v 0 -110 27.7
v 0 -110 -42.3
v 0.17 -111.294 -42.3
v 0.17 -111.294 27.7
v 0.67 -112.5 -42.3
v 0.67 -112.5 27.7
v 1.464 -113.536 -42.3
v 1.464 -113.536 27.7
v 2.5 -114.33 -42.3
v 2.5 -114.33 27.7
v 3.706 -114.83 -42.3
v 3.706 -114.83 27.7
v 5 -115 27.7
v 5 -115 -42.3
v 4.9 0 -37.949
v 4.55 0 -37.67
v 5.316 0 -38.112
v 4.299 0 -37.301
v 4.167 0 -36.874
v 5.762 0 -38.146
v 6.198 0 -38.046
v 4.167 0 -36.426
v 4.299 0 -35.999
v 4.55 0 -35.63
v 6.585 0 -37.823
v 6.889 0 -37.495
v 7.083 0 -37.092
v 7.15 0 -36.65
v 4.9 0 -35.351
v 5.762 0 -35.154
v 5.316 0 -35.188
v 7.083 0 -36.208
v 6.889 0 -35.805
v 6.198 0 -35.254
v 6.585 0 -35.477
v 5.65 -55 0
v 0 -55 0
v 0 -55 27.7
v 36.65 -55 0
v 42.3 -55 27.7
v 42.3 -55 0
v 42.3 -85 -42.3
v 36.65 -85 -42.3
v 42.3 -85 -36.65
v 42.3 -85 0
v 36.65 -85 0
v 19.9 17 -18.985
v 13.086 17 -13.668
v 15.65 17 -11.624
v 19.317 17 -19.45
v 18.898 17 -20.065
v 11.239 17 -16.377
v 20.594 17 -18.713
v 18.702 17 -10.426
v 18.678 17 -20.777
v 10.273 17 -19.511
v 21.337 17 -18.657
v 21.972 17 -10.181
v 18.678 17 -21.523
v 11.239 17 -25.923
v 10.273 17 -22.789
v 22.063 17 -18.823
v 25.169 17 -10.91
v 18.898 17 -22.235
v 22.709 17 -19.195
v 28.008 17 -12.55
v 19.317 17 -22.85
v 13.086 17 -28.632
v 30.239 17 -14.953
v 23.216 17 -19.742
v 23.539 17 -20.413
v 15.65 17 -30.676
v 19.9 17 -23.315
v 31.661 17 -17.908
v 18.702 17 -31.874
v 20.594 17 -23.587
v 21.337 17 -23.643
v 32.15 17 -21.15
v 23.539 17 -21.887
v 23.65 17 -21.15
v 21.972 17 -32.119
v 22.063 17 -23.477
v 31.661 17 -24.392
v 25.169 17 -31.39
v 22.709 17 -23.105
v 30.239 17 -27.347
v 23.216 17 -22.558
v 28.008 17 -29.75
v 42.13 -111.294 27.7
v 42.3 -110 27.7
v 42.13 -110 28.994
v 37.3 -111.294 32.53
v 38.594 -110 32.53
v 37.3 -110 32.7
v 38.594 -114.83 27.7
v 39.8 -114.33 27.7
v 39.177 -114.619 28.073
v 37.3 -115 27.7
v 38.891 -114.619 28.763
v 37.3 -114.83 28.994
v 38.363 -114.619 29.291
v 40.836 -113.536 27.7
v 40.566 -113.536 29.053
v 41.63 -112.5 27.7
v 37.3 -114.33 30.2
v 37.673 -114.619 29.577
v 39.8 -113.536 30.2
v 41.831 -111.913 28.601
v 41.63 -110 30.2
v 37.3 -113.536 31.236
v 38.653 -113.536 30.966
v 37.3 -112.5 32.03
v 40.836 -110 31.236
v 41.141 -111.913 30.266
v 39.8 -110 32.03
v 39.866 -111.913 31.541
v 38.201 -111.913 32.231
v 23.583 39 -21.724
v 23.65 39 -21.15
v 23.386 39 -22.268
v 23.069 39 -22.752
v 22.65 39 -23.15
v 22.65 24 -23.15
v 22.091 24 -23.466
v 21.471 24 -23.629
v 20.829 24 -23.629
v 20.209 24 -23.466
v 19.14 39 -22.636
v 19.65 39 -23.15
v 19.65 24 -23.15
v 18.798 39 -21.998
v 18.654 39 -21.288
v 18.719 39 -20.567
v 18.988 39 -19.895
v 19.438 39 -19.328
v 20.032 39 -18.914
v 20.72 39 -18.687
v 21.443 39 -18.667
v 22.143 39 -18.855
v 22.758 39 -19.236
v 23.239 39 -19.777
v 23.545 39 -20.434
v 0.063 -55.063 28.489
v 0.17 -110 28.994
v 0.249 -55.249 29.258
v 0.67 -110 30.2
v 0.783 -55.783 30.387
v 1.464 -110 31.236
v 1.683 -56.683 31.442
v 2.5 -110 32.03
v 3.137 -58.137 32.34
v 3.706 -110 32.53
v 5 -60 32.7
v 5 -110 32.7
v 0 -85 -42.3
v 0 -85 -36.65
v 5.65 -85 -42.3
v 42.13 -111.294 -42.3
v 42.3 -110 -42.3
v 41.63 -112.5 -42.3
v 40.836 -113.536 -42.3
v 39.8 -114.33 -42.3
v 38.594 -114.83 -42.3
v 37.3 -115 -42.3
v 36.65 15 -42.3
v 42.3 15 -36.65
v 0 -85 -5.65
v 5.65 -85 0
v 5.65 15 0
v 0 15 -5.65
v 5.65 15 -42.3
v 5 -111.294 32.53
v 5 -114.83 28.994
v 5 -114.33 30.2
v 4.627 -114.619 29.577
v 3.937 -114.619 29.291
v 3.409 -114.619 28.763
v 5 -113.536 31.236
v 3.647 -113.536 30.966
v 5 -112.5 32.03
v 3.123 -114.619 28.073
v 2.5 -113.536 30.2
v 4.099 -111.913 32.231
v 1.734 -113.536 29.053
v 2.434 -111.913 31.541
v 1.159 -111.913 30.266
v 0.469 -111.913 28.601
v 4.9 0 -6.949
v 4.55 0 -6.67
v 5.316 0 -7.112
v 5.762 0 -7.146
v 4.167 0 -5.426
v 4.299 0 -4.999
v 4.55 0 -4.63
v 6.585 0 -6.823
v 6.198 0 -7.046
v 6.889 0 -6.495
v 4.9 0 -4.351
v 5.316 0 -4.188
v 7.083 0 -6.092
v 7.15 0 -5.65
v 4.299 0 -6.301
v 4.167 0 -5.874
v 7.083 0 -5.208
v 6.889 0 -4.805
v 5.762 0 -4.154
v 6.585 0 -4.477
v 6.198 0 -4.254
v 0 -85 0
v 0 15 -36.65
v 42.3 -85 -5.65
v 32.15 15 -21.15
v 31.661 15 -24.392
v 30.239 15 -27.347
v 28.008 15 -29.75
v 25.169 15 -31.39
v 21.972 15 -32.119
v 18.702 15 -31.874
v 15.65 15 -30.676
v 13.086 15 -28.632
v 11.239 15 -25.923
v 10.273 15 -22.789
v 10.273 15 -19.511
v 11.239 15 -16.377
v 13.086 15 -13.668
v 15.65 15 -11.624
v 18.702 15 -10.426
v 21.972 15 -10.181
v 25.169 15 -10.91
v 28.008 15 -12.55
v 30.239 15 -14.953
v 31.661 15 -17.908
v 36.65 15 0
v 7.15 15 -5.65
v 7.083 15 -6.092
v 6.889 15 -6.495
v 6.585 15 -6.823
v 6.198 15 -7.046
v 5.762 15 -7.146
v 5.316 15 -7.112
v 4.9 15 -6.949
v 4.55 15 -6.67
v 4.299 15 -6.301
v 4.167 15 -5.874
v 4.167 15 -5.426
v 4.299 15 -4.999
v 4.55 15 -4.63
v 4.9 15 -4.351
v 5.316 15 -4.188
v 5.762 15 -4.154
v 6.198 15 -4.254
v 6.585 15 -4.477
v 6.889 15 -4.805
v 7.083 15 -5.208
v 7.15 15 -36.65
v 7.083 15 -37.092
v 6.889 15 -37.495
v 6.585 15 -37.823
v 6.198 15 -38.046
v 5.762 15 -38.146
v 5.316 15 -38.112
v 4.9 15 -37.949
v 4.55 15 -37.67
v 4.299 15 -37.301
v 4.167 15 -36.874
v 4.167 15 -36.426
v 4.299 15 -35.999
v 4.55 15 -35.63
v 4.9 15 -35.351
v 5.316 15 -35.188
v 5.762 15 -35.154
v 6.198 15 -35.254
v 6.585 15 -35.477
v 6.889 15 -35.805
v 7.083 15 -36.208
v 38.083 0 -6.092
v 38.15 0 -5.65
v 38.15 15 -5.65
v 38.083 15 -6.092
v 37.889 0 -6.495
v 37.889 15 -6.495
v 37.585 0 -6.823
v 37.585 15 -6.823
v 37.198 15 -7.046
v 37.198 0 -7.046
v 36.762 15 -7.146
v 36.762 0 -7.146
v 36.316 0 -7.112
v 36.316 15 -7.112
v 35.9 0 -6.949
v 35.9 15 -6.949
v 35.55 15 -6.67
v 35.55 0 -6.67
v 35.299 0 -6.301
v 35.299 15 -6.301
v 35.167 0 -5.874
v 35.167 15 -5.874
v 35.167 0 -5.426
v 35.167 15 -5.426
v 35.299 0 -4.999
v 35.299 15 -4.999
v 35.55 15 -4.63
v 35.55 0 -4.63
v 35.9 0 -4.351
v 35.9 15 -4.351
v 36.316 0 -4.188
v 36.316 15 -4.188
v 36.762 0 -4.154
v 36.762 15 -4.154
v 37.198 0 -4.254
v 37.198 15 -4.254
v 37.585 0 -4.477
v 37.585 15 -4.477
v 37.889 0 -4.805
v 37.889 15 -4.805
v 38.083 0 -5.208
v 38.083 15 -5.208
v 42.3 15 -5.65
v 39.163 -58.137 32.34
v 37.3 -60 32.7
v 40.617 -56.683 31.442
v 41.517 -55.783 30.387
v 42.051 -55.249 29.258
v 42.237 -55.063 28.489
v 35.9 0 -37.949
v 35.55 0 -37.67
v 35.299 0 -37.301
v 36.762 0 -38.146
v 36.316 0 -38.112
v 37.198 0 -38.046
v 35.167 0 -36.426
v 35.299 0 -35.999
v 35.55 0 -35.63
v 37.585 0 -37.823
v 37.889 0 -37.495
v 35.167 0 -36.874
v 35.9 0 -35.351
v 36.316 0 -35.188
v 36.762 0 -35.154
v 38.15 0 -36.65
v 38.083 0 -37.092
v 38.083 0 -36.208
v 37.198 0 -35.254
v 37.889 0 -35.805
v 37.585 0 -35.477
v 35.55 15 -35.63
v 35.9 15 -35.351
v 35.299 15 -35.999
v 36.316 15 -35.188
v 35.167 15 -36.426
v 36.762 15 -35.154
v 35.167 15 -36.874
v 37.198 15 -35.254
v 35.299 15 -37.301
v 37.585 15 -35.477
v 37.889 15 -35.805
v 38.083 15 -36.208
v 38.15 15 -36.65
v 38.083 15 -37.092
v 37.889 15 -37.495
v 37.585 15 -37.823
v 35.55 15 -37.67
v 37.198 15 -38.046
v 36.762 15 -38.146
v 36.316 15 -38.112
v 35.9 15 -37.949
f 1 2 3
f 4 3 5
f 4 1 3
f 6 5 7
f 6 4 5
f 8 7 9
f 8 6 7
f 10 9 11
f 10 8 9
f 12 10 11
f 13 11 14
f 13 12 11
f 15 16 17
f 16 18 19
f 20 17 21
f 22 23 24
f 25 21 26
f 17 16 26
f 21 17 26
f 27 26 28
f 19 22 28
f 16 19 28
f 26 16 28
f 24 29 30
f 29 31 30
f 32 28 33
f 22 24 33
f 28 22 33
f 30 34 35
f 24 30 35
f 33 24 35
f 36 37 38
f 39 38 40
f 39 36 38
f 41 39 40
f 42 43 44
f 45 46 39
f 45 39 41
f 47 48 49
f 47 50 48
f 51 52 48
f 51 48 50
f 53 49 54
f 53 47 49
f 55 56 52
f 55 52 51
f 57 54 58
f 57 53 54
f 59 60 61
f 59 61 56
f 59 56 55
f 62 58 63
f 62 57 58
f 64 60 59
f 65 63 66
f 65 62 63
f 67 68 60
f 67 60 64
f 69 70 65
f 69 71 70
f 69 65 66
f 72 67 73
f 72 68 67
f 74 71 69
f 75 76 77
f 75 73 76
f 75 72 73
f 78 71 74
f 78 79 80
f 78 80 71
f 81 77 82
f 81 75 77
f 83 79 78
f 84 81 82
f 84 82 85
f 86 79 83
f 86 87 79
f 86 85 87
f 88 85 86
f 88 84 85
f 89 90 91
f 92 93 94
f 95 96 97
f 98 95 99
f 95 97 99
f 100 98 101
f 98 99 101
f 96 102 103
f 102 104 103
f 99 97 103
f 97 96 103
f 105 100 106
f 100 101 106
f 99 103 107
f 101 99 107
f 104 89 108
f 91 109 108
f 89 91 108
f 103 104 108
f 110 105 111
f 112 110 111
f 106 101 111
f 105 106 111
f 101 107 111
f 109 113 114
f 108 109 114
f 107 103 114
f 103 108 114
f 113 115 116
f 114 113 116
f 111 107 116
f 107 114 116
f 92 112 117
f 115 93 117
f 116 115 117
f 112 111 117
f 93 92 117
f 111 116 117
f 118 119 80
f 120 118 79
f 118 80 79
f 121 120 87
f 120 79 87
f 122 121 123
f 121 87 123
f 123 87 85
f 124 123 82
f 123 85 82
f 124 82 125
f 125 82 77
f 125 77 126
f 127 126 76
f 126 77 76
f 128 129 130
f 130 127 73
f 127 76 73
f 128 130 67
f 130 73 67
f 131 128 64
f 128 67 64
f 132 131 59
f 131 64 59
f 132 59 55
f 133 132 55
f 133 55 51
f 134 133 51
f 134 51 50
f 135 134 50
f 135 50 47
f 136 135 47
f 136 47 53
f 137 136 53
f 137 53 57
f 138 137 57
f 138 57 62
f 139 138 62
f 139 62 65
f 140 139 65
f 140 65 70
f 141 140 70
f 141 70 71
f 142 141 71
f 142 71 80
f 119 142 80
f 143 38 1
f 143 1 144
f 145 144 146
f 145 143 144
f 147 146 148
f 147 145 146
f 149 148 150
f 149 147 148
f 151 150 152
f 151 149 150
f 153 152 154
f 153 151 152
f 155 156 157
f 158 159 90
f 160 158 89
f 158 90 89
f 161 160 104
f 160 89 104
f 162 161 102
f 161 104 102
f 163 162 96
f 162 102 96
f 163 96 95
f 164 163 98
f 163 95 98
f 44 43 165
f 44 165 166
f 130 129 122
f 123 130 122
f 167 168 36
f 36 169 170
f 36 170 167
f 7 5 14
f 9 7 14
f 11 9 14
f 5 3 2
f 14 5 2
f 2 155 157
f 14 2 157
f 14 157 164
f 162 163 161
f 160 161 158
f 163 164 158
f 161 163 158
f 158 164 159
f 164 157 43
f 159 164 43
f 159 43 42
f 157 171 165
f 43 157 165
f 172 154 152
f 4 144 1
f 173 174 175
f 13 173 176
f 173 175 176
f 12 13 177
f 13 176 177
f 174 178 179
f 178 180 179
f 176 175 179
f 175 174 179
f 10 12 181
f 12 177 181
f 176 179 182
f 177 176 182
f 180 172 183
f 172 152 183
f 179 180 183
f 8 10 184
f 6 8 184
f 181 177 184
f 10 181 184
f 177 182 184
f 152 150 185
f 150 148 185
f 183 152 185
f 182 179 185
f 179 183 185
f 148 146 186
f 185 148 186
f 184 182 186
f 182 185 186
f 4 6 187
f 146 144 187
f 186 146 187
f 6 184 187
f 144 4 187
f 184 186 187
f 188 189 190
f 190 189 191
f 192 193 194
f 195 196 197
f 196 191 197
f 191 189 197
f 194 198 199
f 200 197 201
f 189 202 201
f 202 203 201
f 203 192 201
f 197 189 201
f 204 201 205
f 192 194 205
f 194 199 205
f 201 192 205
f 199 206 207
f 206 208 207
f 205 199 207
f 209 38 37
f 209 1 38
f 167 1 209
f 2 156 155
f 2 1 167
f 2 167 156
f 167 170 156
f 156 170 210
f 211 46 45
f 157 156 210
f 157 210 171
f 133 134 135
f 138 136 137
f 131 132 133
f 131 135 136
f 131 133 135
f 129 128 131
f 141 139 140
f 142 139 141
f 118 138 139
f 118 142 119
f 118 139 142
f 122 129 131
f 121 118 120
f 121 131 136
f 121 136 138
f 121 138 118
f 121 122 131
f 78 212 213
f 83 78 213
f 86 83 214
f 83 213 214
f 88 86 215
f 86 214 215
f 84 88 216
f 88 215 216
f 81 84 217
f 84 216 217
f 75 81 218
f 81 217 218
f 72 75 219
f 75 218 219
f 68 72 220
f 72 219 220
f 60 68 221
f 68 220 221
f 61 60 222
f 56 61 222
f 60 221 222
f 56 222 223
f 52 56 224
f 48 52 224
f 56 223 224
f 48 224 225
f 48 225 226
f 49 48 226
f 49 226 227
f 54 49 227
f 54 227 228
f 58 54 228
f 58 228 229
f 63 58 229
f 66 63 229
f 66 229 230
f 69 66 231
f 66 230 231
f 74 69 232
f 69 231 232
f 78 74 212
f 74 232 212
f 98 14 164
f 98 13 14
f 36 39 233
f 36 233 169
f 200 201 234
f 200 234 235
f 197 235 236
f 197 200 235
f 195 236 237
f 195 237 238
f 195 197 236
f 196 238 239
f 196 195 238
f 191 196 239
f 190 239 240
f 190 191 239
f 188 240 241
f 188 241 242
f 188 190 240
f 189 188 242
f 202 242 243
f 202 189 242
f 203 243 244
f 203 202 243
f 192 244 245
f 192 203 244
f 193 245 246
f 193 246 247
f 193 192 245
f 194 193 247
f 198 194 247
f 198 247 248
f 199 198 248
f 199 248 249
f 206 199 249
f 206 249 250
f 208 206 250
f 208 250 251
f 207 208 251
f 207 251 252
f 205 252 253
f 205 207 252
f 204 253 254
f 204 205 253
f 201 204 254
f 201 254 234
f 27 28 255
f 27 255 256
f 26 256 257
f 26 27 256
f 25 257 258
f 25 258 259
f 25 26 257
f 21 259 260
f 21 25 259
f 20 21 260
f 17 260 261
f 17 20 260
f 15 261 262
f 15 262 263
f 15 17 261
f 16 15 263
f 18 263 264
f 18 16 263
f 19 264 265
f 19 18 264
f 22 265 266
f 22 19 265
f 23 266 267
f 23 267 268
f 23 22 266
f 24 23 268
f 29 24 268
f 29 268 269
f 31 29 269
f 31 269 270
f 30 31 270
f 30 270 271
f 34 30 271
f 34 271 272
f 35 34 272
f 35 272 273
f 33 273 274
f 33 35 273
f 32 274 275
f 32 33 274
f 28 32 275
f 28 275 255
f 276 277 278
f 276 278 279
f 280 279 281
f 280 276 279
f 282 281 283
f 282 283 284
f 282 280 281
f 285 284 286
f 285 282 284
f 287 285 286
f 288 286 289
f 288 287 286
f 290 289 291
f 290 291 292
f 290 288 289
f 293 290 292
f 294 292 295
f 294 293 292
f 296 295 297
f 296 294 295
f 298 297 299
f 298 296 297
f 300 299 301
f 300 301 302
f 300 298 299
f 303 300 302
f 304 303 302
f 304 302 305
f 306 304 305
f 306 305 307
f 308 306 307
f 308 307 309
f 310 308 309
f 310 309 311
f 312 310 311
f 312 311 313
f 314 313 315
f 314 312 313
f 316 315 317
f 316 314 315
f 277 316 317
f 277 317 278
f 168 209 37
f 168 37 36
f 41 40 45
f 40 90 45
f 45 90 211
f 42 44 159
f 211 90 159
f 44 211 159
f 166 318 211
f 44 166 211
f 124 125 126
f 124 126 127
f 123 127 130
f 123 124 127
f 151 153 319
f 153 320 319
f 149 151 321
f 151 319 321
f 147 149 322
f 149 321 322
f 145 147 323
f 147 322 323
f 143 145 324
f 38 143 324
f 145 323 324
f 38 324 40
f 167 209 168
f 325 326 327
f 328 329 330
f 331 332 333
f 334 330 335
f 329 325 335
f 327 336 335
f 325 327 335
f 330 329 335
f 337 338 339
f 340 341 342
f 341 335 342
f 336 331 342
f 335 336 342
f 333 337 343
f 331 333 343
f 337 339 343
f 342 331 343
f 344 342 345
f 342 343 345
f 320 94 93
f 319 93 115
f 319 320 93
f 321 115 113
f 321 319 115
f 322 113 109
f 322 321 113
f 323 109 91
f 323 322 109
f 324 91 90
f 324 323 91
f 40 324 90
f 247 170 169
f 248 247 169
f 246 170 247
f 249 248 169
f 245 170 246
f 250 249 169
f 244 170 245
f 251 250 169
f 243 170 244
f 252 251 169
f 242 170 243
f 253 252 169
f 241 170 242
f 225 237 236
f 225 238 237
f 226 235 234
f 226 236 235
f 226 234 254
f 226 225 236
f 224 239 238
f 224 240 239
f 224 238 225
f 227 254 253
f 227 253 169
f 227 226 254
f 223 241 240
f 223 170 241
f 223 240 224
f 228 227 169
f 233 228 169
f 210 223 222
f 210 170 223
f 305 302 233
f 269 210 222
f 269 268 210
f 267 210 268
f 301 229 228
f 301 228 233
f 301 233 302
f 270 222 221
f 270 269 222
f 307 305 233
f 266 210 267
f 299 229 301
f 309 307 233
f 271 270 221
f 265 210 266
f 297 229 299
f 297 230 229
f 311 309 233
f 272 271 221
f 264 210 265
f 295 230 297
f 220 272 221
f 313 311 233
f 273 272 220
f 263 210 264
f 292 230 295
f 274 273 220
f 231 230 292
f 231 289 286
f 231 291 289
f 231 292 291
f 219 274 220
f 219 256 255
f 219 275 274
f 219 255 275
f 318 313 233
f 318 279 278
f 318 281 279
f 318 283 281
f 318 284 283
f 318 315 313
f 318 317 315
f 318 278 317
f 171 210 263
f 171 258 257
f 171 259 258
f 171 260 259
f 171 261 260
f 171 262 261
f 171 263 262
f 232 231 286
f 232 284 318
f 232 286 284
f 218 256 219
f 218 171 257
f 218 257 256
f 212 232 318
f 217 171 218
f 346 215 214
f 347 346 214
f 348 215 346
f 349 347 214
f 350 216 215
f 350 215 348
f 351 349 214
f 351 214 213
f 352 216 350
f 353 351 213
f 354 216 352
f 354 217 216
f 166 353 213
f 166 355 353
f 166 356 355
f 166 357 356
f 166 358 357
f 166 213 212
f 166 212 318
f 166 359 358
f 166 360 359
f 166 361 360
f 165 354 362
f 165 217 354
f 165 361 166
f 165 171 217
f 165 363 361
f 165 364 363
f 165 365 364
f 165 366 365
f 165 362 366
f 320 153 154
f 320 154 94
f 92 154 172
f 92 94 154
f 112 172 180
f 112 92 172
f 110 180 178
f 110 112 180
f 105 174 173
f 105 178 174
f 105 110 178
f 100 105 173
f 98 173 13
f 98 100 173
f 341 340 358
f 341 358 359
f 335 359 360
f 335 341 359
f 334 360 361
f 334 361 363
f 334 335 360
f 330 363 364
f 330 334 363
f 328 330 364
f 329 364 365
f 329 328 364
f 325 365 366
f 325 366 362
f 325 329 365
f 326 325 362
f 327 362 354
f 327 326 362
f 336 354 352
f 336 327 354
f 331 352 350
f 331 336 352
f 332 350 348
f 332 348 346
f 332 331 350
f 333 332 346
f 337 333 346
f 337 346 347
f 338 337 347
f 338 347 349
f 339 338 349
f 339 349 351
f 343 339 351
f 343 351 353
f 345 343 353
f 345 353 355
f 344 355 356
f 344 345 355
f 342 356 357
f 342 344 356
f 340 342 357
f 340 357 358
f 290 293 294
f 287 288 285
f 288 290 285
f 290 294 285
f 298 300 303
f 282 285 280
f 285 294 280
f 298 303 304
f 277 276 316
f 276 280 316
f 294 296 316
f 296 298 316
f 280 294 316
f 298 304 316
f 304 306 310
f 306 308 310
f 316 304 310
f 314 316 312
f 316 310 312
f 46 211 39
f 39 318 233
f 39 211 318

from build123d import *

# Parameters (mm, degrees)
SKETCH1_R           = 1.5
BOSS_EXTRUDE1_DEPTH = 15
BOSS_EXTRUDE2_DEPTH = 85
SKETCH3_R           = 11
BOSS_EXTRUDE3_DEPTH = 2
SKETCH4_R           = 2.5
BOSS_EXTRUDE4_DEPTH = 22
CUT_EXTRUDE1_DEPTH  = 15
SKETCH6_W           = 42.3
SKETCH6_H           = 75
BOSS_EXTRUDE5_DEPTH = 30
SKETCH7_W           = 42.3
SKETCH7_H           = 32.7
BOSS_EXTRUDE6_DEPTH = 30
FILLET1_R           = 5


with BuildPart() as part:
    # Sketch1 → Boss-Extrude1 (new body)
    with BuildSketch(Plane(origin=(0, 0, 0), x_dir=(1, 0, 0), z_dir=(0, 1, 0))):
        Polygon((5.65, 0), (36.65, 0), (42.3, 5.65), (42.3, 36.65), (36.65, 42.3), (5.65, 42.3), (0, 36.65), (0, 5.65), align=None)
        with Locations((5.65, 5.65)):
            Circle(SKETCH1_R, mode=Mode.SUBTRACT)
        with Locations((36.65, 5.65)):
            Circle(SKETCH1_R, mode=Mode.SUBTRACT)
        with Locations((36.65, 36.65)):
            Circle(SKETCH1_R, mode=Mode.SUBTRACT)
        with Locations((5.65, 36.65)):
            Circle(SKETCH1_R, mode=Mode.SUBTRACT)
    extrude(amount=BOSS_EXTRUDE1_DEPTH)

    # Sketch2 → Boss-Extrude2 (add)
    with BuildSketch(Plane.XZ):
        Polygon((5.65, 0), (0, -5.65), (0, -36.65), (5.65, -42.3), (36.65, -42.3), (42.3, -36.65), (42.3, -5.65), (36.65, 0), align=None)
    extrude(amount=BOSS_EXTRUDE2_DEPTH)

    # Sketch3 → Boss-Extrude3 (add)
    with BuildSketch(Plane(origin=(0, 15, 0), x_dir=(1, 0, 0), z_dir=(0, 1, 0))):
        with Locations((21.15, 21.15)):
            Circle(SKETCH3_R)
    extrude(amount=BOSS_EXTRUDE3_DEPTH)

    # Sketch4 → Boss-Extrude4 (add)
    with BuildSketch(Plane(origin=(0, 17, 0), x_dir=(1, 0, 0), z_dir=(0, 1, 0))):
        with Locations((21.15, 21.15)):
            Circle(SKETCH4_R)
    extrude(amount=BOSS_EXTRUDE4_DEPTH)

    # Sketch5 → Cut-Extrude1 (cut)
    with BuildSketch(Plane(origin=(0, 39, 0), x_dir=(1, 0, 0), z_dir=(0, 1, 0))):
        with BuildLine():
            Line((19.65, 23.15), (22.65, 23.15))
            ThreePointArc((22.65, 23.15), (21.15, 23.65), (19.65, 23.15))
        make_face()
    extrude(amount=-CUT_EXTRUDE1_DEPTH, mode=Mode.SUBTRACT)

    # Sketch6 → Boss-Extrude5 (add)
    with BuildSketch(Plane.XZ.offset(85)):
        with Locations((21.15, -4.8)):
            Rectangle(SKETCH6_W, SKETCH6_H)
    extrude(amount=BOSS_EXTRUDE5_DEPTH)

    # Sketch7 → Boss-Extrude6 (add)
    with BuildSketch(Plane(origin=(0, -85, 0), x_dir=(1, 0, 0), z_dir=(0, 1, 0))):
        with Locations((21.15, -16.35)):
            Rectangle(SKETCH7_W, SKETCH7_H)
    extrude(amount=BOSS_EXTRUDE6_DEPTH)

    # Fillet1
    fillet1_edges = [part.edges().sort_by_distance(p)[0] for p in [
        (21.15, -55, 32.7),
        (42.3, -85, 32.7),
        (0, -85, 32.7),
        (42.3, -115, -4.8),
        (21.15, -115, 32.7),
        (0, -115, -4.8),
    ]]
    fillet(fillet1_edges, radius=FILLET1_R)


solid = part.part
